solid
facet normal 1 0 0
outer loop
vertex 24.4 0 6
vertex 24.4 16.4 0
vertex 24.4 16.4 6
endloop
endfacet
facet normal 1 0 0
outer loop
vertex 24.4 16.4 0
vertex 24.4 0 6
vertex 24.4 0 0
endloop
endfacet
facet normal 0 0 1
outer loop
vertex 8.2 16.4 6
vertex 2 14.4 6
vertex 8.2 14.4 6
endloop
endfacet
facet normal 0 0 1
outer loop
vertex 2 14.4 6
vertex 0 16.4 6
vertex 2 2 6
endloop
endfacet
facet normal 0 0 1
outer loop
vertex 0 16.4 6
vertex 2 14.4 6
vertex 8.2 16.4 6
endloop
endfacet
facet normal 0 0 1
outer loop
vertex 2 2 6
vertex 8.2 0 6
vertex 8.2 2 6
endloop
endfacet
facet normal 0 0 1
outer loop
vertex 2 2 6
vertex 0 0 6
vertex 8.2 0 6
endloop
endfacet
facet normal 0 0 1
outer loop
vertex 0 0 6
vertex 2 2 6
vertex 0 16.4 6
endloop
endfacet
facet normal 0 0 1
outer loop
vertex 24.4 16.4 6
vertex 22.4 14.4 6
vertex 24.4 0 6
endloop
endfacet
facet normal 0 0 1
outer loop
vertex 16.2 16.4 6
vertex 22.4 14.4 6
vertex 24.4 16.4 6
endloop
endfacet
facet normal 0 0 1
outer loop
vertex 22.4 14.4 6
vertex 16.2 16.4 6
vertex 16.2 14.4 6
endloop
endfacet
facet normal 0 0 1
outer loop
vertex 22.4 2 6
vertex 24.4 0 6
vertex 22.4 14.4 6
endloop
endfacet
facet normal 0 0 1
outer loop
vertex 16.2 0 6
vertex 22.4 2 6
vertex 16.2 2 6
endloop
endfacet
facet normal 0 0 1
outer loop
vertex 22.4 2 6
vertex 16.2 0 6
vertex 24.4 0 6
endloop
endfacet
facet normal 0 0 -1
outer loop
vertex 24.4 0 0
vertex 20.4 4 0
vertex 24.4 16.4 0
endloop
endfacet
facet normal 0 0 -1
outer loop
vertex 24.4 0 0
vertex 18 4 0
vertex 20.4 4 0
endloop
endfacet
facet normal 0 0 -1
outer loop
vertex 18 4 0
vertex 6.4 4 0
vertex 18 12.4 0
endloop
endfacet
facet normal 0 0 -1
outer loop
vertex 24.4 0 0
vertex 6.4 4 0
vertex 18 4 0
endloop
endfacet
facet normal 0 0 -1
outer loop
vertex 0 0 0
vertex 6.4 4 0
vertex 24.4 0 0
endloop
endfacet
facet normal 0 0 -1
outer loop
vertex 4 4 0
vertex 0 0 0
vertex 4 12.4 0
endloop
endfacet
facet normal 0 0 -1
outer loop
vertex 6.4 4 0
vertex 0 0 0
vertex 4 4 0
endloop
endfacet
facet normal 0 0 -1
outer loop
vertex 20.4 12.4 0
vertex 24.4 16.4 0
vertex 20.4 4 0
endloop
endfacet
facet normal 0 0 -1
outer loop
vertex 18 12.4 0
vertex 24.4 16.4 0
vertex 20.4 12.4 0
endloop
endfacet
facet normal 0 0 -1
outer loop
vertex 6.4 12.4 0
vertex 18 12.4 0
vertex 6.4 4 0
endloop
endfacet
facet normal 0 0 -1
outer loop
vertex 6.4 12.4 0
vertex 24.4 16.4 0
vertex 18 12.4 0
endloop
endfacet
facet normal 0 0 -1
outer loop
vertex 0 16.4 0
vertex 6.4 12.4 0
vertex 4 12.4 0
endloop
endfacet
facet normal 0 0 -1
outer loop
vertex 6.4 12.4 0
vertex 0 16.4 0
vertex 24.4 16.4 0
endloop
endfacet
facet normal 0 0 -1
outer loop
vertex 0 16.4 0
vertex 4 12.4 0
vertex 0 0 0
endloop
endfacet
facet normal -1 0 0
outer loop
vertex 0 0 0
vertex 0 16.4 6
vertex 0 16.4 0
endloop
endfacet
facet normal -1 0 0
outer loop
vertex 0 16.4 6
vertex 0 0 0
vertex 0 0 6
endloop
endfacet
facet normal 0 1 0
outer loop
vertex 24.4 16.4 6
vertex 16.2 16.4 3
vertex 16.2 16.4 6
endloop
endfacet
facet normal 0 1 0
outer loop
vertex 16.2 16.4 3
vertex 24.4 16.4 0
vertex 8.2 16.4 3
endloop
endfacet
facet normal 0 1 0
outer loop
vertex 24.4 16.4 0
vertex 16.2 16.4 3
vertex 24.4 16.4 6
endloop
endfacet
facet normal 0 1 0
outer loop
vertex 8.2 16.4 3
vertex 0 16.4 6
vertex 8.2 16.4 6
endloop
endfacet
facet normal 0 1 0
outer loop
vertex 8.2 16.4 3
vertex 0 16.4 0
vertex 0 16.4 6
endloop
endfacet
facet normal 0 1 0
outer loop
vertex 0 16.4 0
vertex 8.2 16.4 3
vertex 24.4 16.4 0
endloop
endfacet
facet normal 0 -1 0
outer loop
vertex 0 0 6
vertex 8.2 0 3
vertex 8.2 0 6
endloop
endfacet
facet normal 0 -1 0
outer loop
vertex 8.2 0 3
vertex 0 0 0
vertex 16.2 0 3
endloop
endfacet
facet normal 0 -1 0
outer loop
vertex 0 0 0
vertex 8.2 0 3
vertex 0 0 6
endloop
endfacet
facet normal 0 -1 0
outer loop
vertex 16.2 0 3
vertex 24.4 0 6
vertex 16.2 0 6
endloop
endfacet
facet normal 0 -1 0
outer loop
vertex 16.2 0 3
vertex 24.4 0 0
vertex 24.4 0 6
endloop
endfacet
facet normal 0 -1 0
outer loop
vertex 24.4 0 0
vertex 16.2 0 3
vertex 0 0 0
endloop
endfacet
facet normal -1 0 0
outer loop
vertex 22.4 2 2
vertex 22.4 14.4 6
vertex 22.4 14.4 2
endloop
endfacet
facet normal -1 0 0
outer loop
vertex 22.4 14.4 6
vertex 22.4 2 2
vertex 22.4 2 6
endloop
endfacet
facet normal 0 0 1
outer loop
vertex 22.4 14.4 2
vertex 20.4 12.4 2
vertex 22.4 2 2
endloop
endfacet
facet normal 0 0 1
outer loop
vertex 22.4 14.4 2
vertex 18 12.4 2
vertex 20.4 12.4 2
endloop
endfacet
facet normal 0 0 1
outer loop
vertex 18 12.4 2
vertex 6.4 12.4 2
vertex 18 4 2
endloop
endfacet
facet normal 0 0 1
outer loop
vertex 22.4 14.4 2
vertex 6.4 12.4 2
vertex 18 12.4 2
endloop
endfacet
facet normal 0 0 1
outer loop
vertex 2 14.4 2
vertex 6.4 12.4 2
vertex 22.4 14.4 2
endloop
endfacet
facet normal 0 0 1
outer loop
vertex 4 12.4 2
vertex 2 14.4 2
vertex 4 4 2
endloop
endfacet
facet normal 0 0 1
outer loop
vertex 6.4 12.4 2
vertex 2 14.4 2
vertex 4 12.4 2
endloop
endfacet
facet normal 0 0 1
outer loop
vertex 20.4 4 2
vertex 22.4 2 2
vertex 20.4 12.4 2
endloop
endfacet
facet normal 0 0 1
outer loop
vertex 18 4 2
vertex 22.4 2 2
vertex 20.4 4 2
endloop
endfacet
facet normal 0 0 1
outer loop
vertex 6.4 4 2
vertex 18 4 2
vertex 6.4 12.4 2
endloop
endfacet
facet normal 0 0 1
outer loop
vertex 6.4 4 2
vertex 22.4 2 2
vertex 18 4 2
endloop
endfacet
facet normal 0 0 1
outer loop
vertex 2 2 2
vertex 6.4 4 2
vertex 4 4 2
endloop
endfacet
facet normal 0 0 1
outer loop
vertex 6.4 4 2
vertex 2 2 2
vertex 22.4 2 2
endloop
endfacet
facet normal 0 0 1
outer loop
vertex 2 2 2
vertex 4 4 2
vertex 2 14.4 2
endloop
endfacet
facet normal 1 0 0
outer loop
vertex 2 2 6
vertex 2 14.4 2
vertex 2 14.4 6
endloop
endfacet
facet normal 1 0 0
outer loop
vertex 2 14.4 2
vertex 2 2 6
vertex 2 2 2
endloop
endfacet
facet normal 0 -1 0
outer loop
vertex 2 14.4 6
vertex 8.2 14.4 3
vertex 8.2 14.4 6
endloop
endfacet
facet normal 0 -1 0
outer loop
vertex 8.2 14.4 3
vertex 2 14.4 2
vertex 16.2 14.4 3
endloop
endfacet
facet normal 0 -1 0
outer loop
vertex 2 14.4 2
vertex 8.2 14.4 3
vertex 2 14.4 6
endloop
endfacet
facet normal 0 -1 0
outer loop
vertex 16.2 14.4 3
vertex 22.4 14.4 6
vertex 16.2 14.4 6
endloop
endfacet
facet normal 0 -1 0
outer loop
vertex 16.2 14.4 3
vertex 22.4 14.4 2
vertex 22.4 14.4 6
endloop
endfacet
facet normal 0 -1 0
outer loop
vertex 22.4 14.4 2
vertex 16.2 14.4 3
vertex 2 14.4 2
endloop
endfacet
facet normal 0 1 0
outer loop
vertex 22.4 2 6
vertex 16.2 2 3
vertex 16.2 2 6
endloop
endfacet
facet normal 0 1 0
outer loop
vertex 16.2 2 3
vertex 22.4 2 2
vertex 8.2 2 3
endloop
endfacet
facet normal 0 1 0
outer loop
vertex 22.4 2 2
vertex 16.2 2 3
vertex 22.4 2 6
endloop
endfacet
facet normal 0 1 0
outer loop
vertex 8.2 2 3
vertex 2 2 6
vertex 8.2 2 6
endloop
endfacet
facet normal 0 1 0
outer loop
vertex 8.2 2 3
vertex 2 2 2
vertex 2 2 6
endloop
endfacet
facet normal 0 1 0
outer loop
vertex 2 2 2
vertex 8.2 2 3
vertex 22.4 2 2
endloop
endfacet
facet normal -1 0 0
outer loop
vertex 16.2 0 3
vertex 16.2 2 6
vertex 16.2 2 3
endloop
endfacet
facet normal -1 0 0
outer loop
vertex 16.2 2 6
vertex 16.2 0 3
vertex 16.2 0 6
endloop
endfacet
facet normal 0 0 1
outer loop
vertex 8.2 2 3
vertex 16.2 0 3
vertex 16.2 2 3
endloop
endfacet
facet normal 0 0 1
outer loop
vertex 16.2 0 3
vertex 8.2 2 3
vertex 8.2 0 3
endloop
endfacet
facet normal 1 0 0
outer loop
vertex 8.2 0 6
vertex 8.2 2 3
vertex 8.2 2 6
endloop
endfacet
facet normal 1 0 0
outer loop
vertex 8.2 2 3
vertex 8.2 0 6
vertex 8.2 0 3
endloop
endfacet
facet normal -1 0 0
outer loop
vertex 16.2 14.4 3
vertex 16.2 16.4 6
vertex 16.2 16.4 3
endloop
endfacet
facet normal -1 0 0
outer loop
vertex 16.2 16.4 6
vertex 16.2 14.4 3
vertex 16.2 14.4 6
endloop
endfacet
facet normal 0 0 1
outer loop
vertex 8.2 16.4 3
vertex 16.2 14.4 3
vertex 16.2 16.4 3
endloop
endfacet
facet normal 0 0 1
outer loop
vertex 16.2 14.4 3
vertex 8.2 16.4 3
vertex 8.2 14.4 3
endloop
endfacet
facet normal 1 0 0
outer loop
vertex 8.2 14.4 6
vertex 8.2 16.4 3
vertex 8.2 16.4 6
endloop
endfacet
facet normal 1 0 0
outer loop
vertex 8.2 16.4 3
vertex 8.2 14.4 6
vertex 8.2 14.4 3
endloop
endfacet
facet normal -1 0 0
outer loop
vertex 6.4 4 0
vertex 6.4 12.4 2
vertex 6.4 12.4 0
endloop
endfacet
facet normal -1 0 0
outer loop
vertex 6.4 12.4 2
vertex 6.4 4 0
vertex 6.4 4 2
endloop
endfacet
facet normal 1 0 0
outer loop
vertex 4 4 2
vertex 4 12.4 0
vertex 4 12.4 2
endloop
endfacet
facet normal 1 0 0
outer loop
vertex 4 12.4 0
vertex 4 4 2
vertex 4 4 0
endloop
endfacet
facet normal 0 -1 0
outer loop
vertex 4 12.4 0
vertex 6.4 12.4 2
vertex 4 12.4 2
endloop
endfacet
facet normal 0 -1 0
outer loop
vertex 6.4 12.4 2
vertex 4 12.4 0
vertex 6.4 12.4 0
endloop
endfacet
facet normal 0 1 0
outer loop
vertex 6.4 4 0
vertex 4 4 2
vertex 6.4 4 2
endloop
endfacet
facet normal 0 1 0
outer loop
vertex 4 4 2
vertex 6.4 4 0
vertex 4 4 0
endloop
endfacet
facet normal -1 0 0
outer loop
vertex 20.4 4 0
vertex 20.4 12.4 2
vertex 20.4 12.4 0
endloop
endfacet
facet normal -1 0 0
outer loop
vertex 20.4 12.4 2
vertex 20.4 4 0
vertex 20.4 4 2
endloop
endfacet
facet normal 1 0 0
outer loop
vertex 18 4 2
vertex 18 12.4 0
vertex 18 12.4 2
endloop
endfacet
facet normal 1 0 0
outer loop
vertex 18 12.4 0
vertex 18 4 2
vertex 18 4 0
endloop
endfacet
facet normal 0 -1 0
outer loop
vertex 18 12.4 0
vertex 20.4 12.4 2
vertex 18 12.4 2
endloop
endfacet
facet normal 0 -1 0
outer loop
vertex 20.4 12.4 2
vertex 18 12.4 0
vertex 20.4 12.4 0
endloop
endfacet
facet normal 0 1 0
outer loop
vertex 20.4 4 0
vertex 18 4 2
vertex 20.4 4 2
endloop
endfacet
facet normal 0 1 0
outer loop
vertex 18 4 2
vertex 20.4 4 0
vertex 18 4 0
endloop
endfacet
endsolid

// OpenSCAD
// Original MechIntel educational model. CC0-1.0. Units: mm.
// Not a standardized or load-rated component.
$fn=96;
inner_x=20.4;
inner_y=12.4;
wall=2;
floor=2;
rim=4;
slot=2.4;
$fn=64;
difference(){
 union(){
  translate([0,0,0]) cube([inner_x+2*wall,inner_y+2*wall,floor+rim]);
 }
 translate([wall,wall,floor]) cube([inner_x,inner_y,rim+1]);
 translate([wall+inner_x/2-4,-1,floor+1]) cube([8,wall+2,rim]);
 translate([wall+inner_x/2-4,inner_y+wall-1,floor+1]) cube([8,wall+2,rim]);
 translate([4,4,-1]) cube([slot,inner_y-4,floor+1]);
 translate([inner_x+2*wall-4-slot,4,-1]) cube([slot,inner_y-4,floor+1]);
}
